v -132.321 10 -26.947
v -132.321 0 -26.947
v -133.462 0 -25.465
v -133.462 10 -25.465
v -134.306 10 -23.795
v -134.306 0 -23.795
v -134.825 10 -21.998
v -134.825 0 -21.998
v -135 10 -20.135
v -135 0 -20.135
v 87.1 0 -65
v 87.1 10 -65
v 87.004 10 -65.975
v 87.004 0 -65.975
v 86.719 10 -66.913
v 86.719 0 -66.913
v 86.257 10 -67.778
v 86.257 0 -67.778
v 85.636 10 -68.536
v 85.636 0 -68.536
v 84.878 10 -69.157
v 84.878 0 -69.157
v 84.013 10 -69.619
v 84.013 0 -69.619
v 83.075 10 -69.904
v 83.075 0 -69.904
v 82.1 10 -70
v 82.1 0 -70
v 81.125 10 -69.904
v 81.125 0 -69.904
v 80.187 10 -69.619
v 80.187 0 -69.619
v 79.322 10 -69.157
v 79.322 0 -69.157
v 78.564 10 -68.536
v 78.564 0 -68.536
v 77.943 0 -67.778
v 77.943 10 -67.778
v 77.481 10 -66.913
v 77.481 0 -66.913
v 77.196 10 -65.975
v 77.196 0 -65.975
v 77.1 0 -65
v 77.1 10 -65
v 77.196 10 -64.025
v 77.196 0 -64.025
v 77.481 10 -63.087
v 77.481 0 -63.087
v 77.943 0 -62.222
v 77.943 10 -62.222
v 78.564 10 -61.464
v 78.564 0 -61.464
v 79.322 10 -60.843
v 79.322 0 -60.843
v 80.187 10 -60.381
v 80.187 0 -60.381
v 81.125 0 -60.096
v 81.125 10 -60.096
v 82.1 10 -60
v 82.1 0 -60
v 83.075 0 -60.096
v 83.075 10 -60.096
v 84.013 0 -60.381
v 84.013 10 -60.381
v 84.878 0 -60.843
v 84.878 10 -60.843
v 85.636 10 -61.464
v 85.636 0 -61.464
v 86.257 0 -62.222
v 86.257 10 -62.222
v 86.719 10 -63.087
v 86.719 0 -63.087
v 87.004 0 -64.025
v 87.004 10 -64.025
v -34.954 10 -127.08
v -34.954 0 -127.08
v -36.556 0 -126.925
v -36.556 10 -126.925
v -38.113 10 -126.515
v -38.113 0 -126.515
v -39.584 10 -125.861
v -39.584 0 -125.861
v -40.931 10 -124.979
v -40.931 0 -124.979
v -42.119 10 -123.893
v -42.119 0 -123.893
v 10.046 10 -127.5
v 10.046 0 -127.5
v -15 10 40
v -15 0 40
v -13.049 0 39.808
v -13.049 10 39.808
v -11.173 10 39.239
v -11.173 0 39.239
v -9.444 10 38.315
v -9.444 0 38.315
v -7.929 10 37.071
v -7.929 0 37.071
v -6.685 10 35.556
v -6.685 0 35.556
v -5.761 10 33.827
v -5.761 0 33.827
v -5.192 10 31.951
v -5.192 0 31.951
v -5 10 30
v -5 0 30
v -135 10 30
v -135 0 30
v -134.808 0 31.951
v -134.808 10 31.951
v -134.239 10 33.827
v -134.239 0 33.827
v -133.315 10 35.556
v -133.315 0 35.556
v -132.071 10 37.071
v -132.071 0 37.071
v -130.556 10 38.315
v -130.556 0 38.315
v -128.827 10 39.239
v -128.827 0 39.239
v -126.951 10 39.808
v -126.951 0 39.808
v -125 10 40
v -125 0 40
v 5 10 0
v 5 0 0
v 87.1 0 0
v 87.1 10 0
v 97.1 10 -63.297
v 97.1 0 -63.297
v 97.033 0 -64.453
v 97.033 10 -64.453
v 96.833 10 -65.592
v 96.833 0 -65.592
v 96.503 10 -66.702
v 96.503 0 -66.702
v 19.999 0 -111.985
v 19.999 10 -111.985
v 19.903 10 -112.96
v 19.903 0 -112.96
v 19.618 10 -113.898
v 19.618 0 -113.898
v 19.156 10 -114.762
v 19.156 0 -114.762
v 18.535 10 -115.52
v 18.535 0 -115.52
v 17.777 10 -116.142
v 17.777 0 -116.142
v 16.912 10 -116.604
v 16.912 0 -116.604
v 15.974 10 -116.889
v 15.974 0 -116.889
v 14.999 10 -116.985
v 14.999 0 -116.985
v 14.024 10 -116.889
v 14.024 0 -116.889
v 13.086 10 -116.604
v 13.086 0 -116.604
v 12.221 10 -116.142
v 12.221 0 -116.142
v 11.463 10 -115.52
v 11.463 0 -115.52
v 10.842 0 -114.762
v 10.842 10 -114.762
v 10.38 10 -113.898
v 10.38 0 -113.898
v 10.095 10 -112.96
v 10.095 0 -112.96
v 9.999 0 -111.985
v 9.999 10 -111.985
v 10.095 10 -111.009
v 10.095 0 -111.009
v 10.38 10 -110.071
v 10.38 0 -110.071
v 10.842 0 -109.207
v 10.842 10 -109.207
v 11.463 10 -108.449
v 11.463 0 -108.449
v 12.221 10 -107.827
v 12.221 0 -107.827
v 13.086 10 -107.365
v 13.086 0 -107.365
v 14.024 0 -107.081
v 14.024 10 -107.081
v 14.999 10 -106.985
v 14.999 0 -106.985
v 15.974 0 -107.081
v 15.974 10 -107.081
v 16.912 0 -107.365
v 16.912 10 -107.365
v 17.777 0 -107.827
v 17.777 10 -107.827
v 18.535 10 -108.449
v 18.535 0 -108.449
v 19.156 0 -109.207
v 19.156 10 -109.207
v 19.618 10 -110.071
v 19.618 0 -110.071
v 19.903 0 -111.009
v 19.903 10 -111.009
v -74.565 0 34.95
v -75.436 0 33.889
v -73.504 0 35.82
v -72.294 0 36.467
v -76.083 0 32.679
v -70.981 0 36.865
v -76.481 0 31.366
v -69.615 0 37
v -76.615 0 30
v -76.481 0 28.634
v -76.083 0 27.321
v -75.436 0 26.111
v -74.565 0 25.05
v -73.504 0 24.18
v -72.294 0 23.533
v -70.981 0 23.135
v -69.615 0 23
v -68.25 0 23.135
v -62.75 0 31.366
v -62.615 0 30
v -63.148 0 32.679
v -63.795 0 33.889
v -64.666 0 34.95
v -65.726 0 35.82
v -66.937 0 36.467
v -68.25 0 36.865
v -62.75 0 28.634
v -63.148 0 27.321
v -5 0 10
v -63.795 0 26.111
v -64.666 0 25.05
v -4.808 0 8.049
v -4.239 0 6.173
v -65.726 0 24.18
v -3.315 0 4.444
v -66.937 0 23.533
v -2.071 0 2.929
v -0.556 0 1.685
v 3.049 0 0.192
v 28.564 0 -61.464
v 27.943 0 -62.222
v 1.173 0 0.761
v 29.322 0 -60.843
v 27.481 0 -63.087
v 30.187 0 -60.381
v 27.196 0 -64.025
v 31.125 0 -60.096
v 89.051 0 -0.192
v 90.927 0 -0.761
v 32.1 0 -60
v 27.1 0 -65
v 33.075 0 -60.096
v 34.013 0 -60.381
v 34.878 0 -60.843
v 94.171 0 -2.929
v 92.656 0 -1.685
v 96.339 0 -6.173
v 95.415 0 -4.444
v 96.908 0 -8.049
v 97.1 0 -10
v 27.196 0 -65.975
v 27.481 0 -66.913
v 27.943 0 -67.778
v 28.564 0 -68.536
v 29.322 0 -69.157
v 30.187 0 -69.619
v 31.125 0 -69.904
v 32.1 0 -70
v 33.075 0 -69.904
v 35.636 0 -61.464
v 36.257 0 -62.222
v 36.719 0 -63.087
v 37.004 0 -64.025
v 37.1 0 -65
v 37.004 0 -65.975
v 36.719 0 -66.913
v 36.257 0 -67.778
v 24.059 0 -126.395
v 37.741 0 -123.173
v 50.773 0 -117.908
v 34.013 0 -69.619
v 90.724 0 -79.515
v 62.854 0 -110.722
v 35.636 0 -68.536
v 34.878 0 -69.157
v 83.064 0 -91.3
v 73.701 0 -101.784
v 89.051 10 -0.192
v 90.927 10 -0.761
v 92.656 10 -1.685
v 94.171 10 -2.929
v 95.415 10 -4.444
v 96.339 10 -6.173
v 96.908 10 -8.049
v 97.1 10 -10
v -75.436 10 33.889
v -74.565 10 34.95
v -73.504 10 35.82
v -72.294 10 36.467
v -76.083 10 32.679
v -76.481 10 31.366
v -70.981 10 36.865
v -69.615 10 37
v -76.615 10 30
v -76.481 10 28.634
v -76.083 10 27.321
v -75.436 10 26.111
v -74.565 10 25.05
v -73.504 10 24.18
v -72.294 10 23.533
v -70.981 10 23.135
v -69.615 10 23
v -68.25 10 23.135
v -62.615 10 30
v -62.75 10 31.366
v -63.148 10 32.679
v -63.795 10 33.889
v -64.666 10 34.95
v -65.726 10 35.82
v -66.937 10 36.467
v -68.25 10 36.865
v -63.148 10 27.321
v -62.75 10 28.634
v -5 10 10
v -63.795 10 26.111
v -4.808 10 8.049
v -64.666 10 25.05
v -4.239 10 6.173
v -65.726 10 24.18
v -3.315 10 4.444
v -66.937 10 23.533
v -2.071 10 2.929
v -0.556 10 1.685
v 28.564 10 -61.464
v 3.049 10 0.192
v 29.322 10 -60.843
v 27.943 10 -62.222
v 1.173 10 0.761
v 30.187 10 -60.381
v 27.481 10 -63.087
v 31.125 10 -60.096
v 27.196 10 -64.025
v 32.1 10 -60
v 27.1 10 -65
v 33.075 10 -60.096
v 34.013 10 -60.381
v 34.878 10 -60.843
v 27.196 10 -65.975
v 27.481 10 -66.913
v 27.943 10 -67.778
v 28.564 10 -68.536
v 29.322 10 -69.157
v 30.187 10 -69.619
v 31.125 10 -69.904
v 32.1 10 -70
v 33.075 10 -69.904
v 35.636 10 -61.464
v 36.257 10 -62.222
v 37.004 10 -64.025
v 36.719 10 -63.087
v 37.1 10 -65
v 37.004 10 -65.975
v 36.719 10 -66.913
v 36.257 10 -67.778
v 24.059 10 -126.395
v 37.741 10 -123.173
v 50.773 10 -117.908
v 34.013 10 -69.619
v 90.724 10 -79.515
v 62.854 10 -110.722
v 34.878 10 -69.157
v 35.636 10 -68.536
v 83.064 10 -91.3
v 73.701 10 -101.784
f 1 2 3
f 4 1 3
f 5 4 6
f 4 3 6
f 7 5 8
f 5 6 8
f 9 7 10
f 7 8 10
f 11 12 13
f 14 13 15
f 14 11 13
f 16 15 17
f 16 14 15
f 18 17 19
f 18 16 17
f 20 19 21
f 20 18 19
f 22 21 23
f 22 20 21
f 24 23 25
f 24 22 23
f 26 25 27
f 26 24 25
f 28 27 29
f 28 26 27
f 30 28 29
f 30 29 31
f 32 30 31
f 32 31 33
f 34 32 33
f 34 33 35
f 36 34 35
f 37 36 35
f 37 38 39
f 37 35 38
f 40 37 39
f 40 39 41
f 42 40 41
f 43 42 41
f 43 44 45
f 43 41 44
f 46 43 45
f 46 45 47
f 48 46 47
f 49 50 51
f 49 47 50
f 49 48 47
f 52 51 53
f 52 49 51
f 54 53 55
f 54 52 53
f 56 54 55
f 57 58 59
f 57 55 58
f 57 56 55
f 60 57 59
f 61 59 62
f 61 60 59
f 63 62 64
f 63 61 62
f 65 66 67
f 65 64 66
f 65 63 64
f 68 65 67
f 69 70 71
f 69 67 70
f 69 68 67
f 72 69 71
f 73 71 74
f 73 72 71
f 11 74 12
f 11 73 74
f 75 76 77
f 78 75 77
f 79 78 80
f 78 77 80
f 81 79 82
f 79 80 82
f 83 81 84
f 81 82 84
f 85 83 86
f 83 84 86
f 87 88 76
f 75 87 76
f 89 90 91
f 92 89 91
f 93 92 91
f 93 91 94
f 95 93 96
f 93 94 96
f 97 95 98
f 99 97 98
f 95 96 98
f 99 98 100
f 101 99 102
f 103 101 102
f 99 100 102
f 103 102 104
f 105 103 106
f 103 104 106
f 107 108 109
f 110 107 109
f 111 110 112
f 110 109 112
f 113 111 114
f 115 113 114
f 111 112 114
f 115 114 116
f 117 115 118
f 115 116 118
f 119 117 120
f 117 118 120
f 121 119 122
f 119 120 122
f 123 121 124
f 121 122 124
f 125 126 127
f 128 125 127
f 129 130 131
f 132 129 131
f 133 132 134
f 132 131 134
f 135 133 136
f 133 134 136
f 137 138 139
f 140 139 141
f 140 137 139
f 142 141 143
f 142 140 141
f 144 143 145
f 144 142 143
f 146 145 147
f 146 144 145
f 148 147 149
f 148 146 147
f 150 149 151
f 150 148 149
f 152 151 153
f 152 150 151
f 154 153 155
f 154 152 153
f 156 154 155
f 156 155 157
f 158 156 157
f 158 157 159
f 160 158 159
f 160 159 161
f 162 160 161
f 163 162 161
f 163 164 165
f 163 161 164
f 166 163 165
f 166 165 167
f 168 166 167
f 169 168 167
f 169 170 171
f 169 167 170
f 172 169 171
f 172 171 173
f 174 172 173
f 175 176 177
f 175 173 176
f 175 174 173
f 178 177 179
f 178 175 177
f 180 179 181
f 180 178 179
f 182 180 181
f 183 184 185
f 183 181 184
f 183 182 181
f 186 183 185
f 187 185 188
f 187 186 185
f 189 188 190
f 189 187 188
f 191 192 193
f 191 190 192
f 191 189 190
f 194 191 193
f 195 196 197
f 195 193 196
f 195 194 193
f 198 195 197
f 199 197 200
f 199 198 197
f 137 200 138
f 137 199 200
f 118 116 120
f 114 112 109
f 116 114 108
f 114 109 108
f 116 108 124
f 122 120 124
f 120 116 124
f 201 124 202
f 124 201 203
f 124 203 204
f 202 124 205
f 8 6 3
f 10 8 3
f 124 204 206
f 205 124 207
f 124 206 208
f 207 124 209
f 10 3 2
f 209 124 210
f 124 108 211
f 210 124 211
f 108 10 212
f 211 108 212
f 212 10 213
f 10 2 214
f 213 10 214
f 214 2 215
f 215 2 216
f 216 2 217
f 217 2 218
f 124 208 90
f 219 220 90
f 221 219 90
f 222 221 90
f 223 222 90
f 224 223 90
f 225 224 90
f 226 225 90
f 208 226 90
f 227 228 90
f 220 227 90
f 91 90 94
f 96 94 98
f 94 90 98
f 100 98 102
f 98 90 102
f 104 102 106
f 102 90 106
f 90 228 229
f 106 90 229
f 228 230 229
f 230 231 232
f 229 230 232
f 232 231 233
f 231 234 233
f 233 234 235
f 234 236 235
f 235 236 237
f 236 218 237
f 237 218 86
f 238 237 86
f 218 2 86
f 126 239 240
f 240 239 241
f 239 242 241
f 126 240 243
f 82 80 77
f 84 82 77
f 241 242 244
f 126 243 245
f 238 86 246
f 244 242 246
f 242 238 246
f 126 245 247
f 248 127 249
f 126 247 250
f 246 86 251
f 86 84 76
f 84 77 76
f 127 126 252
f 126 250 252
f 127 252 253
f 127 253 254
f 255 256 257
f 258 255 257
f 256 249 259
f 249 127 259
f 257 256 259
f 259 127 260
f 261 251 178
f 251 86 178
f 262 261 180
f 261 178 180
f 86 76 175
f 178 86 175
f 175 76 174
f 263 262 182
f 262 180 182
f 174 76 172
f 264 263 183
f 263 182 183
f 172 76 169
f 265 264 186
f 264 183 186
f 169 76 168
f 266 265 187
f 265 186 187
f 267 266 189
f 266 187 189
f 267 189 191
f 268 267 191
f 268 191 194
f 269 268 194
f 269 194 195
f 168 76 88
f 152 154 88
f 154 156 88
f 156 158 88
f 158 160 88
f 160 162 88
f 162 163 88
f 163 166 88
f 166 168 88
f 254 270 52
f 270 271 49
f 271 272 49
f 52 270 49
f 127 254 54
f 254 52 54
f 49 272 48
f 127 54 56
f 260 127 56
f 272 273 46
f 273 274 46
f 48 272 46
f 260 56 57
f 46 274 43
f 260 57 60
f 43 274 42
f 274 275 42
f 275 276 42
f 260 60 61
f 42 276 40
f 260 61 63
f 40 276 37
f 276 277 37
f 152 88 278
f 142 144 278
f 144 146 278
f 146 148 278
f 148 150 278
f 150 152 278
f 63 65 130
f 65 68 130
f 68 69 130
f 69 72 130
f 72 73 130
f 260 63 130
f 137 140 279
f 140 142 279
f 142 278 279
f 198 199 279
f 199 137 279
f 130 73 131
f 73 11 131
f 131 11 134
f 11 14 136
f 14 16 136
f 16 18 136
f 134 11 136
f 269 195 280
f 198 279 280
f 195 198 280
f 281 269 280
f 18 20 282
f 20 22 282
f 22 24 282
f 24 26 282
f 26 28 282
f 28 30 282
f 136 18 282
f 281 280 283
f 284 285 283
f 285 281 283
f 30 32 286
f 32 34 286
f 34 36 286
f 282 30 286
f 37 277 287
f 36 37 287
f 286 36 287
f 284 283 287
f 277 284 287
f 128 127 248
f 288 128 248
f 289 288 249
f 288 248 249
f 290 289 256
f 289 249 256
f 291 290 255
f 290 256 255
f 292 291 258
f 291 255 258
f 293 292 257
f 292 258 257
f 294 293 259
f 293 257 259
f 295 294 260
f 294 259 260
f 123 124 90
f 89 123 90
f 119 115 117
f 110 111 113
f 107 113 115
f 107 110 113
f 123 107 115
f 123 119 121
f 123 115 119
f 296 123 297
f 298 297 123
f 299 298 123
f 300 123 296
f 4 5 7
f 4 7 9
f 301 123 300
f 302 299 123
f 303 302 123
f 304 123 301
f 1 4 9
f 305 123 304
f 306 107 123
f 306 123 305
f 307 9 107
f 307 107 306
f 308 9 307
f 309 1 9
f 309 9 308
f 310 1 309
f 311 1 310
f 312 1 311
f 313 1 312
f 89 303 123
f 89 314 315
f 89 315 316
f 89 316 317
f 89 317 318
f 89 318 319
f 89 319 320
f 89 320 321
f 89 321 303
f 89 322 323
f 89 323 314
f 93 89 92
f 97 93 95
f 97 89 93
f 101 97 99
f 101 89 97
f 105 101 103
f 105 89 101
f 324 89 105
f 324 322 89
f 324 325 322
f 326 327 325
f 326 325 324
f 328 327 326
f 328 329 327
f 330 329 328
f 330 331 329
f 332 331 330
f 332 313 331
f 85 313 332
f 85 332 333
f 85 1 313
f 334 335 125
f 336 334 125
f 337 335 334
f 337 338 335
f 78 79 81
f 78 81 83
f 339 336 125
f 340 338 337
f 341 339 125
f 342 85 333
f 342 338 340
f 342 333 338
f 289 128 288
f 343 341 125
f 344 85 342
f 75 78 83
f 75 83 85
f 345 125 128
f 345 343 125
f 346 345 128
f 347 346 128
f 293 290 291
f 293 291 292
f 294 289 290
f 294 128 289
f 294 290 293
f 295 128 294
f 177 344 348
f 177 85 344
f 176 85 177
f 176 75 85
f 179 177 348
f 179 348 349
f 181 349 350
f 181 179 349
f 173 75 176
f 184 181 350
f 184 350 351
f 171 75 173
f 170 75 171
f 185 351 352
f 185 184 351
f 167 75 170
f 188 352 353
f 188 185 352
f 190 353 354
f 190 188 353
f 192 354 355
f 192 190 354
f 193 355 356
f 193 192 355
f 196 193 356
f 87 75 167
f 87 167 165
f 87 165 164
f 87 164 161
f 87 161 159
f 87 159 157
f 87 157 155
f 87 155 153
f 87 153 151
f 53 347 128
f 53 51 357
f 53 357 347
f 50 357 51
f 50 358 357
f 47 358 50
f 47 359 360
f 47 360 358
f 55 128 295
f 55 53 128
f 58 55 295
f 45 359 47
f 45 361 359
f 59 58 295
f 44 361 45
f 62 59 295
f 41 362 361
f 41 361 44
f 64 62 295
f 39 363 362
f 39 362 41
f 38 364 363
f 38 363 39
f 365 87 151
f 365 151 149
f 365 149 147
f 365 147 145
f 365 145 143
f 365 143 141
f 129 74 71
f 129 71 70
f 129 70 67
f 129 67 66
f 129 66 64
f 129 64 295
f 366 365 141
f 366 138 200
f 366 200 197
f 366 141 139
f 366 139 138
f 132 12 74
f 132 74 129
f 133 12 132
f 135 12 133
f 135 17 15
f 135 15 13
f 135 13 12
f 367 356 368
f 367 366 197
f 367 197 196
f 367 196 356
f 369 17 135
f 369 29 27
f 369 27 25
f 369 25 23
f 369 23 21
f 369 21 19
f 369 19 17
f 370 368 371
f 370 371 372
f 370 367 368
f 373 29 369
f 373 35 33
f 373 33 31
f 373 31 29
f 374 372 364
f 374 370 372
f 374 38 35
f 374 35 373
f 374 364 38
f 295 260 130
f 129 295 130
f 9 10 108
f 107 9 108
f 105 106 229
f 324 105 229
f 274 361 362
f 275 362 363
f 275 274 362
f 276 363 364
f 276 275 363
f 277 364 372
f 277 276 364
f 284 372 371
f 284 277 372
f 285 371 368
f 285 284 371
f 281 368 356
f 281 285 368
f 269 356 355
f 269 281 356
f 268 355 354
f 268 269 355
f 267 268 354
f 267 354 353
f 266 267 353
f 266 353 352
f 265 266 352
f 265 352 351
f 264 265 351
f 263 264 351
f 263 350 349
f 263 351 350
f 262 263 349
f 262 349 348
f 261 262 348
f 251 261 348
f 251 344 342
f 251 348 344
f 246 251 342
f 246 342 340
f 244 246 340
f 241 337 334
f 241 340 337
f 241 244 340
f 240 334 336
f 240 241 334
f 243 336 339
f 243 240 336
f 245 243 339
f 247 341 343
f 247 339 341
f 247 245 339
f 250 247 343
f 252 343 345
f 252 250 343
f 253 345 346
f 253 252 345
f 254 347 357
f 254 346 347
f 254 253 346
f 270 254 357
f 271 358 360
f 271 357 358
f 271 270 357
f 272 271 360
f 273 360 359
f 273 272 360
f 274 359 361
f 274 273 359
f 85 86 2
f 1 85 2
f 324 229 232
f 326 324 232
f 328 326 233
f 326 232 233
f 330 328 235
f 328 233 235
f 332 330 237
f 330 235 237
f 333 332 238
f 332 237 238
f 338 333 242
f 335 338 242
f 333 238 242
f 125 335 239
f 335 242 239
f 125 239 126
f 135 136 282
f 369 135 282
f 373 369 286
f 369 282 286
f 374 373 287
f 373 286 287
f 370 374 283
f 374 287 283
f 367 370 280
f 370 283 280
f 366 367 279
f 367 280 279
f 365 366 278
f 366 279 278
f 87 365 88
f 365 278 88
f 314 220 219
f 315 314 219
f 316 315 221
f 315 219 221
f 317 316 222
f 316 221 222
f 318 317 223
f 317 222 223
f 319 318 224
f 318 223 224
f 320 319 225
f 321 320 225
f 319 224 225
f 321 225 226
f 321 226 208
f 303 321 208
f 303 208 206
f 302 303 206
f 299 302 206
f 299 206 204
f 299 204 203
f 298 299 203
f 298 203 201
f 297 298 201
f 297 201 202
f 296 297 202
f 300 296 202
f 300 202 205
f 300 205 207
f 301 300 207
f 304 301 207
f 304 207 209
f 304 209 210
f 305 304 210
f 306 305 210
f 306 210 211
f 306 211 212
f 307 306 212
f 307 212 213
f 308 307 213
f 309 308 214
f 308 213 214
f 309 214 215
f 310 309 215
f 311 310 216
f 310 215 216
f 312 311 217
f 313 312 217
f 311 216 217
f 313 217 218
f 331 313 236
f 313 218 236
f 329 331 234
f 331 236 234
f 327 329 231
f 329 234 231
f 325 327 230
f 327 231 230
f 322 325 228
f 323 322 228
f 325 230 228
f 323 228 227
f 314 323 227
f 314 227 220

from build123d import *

# Parameters (mm, degrees)
BOSS_EXTRUDE1_DEPTH     = 10
SKETCH2_R               = 5
CUT_EXTRUDE4_DEPTH      = 11
CUT_EXTRUDE4_DEPTH_BACK = 1
SKETCH3_R               = 7
CUT_EXTRUDE5_DEPTH      = 11


with BuildPart() as part:
    # Sketch1 → Boss-Extrude1 (new body)
    with BuildSketch(Plane(origin=(0, 0, 0), x_dir=(1, 0, 0), z_dir=(0, 1, 0))):
        with BuildLine():
            Line((5, 0), (87.1, 0))
            ThreePointArc((87.1, 0), (94.171067812, 2.928932188), (97.1, 10))
            Line((97.1, 10), (97.1, 63.297208828))
            ThreePointArc((97.1, 63.297208828), (96.949532816, 65.025416948), (96.502659338, 66.701617347))
            ThreePointArc((96.502659338, 66.701617347), (62.853663281, 110.72240479), (10.046495568, 127.5))
            Line((10.046495568, 127.5), (-34.953504432, 127.079547292))
            ThreePointArc((-34.953504432, 127.079547292), (-38.861917641, 126.217874558), (-42.119413536, 123.892601626))
            Line((-42.119413536, 123.892601626), (-132.321113421, 26.947294417))
            ThreePointArc((-132.321113421, 26.947294417), (-134.306211211, 23.795285131), (-135, 20.135444575))
            Line((-135, 20.135444575), (-135, -30))
            ThreePointArc((-135, -30), (-132.071067812, -37.071067812), (-125, -40))
            Line((-125, -40), (-15, -40))
            ThreePointArc((-15, -40), (-7.928932188, -37.071067812), (-5, -30))
            Line((-5, -30), (-5, -10))
            ThreePointArc((-5, -10), (-2.071067812, -2.928932188), (5, 0))
        make_face()
    extrude(amount=BOSS_EXTRUDE1_DEPTH)

    # Sketch2 → Cut-Extrude4 (cut, two sides)
    with BuildSketch(Plane(origin=(0, 0, 0), x_dir=(1, 0, 0), z_dir=(0, 1, 0))) as cut_extrude4_sk:
        with Locations((14.998992834, 111.984631039)):
            Circle(SKETCH2_R)
        with Locations((82.1, 65)):
            Circle(SKETCH2_R)
        with Locations((32.1, 65)):
            Circle(SKETCH2_R)
    extrude(amount=CUT_EXTRUDE4_DEPTH, mode=Mode.SUBTRACT)
    extrude(cut_extrude4_sk.sketch, amount=-CUT_EXTRUDE4_DEPTH_BACK, mode=Mode.SUBTRACT)

    # Sketch3 → Cut-Extrude5 (cut, through all)
    with BuildSketch(Plane.XZ):
        with Locations((-69.615384615, 30)):
            Circle(SKETCH3_R)
    extrude(amount=-CUT_EXTRUDE5_DEPTH, mode=Mode.SUBTRACT)


solid = part.part
